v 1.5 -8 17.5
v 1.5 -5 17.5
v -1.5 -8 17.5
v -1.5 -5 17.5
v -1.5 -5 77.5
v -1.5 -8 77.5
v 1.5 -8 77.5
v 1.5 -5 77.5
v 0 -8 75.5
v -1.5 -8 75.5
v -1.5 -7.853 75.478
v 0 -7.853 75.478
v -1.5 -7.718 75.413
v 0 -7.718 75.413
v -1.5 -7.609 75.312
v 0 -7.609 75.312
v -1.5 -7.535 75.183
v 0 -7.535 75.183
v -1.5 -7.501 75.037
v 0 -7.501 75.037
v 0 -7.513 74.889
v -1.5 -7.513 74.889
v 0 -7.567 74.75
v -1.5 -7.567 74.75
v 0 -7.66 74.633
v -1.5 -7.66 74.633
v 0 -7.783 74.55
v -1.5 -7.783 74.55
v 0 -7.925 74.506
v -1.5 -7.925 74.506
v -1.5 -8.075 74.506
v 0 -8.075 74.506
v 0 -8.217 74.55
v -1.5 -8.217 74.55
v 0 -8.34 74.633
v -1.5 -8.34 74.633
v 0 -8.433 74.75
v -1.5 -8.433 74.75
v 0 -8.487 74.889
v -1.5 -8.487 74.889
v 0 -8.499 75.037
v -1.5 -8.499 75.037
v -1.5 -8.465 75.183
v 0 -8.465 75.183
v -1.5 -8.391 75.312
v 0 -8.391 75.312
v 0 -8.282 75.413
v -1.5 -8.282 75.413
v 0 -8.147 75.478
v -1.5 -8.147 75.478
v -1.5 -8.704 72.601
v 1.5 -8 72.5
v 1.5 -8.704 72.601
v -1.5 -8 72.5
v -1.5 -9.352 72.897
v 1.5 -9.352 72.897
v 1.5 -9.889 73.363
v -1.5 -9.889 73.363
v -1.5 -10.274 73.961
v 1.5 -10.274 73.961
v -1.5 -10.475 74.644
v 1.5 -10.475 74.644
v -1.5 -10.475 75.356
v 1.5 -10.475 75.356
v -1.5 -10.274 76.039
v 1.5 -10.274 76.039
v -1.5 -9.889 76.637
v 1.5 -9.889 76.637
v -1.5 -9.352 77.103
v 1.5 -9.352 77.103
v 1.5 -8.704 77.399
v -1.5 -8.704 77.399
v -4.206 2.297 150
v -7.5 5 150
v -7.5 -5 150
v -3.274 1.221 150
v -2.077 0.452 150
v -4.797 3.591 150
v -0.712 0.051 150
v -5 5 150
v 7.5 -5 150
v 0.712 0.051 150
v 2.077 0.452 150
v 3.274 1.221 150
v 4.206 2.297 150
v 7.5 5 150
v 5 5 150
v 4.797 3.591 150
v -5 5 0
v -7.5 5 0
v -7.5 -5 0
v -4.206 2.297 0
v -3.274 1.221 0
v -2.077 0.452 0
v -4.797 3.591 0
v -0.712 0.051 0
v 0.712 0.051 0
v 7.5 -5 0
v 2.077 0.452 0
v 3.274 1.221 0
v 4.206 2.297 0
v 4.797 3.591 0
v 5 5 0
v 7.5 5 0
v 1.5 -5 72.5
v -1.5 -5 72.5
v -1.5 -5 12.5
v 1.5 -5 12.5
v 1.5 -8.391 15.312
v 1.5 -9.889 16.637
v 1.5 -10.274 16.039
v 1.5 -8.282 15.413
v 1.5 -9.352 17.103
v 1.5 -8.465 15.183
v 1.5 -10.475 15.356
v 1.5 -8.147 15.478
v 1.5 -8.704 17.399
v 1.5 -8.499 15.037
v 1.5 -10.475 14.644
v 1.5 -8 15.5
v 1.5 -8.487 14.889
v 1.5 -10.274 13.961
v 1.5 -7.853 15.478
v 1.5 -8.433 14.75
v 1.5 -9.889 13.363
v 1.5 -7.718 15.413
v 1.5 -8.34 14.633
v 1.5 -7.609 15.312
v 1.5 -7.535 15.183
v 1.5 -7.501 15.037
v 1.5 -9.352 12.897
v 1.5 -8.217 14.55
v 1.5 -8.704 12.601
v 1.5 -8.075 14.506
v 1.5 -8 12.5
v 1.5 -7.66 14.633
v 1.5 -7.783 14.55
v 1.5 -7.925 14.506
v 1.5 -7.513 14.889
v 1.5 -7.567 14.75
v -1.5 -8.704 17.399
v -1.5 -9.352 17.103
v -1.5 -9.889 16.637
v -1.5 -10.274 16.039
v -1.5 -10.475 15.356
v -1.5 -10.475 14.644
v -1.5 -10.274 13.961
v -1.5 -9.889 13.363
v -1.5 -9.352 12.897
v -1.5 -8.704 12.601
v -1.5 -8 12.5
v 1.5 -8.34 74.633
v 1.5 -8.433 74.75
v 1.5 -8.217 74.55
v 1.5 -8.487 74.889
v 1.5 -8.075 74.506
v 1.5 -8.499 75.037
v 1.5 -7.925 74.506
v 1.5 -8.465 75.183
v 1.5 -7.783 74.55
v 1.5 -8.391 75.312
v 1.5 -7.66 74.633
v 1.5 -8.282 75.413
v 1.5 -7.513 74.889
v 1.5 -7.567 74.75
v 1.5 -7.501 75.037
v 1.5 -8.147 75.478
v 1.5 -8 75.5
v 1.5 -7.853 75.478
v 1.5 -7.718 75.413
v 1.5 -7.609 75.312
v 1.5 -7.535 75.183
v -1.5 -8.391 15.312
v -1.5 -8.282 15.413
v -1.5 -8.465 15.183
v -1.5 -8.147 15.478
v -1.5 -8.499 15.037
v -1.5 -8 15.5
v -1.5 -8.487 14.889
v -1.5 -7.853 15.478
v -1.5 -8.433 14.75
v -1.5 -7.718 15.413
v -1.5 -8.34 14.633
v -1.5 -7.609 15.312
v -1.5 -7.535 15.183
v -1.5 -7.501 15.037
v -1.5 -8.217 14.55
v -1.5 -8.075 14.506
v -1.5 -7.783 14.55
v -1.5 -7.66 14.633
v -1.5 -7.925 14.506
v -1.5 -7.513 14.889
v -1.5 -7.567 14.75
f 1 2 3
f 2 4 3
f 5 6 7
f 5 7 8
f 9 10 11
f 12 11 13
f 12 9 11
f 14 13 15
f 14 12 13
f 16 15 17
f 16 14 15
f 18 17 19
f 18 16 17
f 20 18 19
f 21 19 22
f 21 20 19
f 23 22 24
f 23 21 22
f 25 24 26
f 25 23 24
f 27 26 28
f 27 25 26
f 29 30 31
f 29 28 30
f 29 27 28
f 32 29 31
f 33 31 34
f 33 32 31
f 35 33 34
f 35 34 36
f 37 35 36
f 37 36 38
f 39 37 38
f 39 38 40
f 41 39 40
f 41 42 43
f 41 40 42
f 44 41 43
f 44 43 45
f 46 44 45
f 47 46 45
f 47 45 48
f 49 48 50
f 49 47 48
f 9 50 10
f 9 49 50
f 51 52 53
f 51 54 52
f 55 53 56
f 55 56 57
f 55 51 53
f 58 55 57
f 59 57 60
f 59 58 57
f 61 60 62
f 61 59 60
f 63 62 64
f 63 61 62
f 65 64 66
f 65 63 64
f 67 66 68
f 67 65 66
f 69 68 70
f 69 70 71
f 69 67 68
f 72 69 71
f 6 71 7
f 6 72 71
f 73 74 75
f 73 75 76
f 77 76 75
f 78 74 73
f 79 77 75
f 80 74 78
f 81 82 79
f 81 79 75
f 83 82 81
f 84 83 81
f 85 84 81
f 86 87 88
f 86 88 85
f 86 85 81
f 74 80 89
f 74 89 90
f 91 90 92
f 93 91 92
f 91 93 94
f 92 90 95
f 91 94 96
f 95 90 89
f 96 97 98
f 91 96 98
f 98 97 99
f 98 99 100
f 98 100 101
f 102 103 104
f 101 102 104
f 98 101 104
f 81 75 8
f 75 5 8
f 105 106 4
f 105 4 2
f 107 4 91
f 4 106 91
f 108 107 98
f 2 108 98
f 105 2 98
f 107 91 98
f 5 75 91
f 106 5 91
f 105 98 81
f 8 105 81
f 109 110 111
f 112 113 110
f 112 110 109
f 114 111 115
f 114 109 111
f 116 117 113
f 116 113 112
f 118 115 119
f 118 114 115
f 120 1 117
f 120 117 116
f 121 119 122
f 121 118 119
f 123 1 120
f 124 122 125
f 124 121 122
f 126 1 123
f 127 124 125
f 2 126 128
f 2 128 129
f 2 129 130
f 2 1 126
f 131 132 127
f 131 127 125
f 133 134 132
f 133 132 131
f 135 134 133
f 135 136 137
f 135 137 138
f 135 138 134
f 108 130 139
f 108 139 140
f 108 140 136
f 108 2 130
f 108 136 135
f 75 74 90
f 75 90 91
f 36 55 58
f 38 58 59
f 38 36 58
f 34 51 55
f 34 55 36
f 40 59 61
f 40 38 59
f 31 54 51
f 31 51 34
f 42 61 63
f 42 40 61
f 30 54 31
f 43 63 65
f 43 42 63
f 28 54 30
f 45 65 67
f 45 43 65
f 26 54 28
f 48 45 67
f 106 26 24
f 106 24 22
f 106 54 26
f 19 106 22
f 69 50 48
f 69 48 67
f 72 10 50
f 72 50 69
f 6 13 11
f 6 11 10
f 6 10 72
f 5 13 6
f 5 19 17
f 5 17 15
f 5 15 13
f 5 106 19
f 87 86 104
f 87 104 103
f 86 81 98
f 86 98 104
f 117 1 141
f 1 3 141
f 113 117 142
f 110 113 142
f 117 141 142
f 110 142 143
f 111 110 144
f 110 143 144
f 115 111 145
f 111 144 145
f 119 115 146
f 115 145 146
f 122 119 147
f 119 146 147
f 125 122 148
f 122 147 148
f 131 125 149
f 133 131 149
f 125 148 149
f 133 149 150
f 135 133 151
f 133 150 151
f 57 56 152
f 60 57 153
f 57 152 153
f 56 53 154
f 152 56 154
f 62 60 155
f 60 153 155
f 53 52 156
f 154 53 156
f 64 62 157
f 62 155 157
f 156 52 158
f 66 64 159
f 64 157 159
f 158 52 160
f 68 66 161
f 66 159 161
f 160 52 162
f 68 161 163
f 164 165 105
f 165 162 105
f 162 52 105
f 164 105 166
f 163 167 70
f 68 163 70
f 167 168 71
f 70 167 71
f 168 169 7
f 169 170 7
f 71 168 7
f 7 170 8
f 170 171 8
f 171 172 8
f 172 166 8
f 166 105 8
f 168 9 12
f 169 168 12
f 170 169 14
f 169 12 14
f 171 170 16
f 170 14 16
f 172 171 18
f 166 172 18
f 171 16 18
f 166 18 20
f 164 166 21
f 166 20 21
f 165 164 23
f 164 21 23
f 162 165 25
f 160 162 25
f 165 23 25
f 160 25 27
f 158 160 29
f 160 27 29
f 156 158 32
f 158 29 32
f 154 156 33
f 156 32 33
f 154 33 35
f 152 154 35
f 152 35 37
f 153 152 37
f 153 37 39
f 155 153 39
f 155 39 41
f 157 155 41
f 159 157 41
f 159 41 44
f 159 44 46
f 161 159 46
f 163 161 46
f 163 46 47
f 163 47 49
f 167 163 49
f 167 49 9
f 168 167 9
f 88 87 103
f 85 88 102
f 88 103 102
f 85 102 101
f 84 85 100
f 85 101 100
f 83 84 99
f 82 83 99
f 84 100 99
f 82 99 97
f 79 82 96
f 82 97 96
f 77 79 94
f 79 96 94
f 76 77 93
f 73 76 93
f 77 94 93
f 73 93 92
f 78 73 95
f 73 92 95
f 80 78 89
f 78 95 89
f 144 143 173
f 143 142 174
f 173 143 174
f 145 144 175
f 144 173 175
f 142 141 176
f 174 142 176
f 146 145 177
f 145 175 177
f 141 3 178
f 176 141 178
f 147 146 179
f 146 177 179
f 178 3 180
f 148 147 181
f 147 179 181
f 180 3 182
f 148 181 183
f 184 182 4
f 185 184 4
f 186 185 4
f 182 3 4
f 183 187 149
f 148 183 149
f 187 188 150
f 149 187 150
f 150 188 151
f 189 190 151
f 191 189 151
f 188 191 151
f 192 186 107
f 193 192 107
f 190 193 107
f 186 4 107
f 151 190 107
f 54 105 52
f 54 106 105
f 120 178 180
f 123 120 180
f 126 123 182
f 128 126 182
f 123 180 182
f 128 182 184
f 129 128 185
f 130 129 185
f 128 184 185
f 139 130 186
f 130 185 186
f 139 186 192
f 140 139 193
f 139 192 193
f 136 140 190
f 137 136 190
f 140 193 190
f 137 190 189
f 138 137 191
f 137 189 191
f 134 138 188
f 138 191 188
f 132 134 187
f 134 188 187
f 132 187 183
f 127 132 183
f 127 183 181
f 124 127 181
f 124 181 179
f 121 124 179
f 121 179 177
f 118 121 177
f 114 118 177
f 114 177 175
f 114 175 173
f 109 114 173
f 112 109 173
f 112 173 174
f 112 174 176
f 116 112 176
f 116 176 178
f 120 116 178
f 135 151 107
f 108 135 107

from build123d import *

# Parameters (mm, degrees)
BOSS_EXTRUDE1_DEPTH     = 150
BOSS_EXTRUDE6_DEPTH     = 1.5
SKETCH7_R               = 0.5
CUT_EXTRUDE1_DEPTH      = 8.5
CUT_EXTRUDE1_DEPTH_BACK = 8.5
SKETCH9_R               = 0.5
CUT_EXTRUDE2_DEPTH      = 10


with BuildPart() as part:
    # Sketch1 → Boss-Extrude1 (new body)
    with BuildSketch(Plane.XY):
        with BuildLine():
            Line((7.5, 5), (5, 5))
            ThreePointArc((5, 5), (0, 0), (-5, 5))
            Line((-5, 5), (-7.5, 5))
            Line((-7.5, 5), (-7.5, -5))
            Line((-7.5, -5), (7.5, -5))
            Line((7.5, -5), (7.5, 5))
        make_face()
    extrude(amount=BOSS_EXTRUDE1_DEPTH)

    # Sketch6 → Boss-Extrude6 (add, symmetric)
    with BuildSketch(Plane.ZY):
        with BuildLine():
            ThreePointArc((77.5, -8), (75, -5.5), (72.5, -8))
            Line((72.5, -8), (77.5, -8))
        make_face()
        with BuildLine():
            Line((77.5, -8), (72.5, -8))
            ThreePointArc((72.5, -8), (75, -10.5), (77.5, -8))
        make_face()
        with BuildLine():
            Line((77.5, -5), (72.5, -5))
            Line((72.5, -5), (72.5, -8))
            ThreePointArc((72.5, -8), (75, -5.5), (77.5, -8))
            Line((77.5, -8), (77.5, -5))
        make_face()
    boss_extrude6 = extrude(amount=BOSS_EXTRUDE6_DEPTH, both=True)

    # Mirror1: Boss-Extrude6 across plane
    add(boss_extrude6.mirror(Plane(origin=(0, 0, 45), x_dir=(1, 0, 0), z_dir=(0, 0, -1))))

    # Sketch7 → Cut-Extrude1 (cut, two sides)
    with BuildSketch(Plane.ZY) as cut_extrude1_sk:
        with Locations((75, -8)):
            Circle(SKETCH7_R)
    extrude(amount=CUT_EXTRUDE1_DEPTH, mode=Mode.SUBTRACT)
    extrude(cut_extrude1_sk.sketch, amount=-CUT_EXTRUDE1_DEPTH_BACK, mode=Mode.SUBTRACT)

    # Sketch9 → Cut-Extrude2 (cut)
    with BuildSketch(Plane.ZY.offset(1.5)):
        with Locations((15, -8)):
            Circle(SKETCH9_R)
    extrude(amount=-CUT_EXTRUDE2_DEPTH, mode=Mode.SUBTRACT)


solid = part.part
